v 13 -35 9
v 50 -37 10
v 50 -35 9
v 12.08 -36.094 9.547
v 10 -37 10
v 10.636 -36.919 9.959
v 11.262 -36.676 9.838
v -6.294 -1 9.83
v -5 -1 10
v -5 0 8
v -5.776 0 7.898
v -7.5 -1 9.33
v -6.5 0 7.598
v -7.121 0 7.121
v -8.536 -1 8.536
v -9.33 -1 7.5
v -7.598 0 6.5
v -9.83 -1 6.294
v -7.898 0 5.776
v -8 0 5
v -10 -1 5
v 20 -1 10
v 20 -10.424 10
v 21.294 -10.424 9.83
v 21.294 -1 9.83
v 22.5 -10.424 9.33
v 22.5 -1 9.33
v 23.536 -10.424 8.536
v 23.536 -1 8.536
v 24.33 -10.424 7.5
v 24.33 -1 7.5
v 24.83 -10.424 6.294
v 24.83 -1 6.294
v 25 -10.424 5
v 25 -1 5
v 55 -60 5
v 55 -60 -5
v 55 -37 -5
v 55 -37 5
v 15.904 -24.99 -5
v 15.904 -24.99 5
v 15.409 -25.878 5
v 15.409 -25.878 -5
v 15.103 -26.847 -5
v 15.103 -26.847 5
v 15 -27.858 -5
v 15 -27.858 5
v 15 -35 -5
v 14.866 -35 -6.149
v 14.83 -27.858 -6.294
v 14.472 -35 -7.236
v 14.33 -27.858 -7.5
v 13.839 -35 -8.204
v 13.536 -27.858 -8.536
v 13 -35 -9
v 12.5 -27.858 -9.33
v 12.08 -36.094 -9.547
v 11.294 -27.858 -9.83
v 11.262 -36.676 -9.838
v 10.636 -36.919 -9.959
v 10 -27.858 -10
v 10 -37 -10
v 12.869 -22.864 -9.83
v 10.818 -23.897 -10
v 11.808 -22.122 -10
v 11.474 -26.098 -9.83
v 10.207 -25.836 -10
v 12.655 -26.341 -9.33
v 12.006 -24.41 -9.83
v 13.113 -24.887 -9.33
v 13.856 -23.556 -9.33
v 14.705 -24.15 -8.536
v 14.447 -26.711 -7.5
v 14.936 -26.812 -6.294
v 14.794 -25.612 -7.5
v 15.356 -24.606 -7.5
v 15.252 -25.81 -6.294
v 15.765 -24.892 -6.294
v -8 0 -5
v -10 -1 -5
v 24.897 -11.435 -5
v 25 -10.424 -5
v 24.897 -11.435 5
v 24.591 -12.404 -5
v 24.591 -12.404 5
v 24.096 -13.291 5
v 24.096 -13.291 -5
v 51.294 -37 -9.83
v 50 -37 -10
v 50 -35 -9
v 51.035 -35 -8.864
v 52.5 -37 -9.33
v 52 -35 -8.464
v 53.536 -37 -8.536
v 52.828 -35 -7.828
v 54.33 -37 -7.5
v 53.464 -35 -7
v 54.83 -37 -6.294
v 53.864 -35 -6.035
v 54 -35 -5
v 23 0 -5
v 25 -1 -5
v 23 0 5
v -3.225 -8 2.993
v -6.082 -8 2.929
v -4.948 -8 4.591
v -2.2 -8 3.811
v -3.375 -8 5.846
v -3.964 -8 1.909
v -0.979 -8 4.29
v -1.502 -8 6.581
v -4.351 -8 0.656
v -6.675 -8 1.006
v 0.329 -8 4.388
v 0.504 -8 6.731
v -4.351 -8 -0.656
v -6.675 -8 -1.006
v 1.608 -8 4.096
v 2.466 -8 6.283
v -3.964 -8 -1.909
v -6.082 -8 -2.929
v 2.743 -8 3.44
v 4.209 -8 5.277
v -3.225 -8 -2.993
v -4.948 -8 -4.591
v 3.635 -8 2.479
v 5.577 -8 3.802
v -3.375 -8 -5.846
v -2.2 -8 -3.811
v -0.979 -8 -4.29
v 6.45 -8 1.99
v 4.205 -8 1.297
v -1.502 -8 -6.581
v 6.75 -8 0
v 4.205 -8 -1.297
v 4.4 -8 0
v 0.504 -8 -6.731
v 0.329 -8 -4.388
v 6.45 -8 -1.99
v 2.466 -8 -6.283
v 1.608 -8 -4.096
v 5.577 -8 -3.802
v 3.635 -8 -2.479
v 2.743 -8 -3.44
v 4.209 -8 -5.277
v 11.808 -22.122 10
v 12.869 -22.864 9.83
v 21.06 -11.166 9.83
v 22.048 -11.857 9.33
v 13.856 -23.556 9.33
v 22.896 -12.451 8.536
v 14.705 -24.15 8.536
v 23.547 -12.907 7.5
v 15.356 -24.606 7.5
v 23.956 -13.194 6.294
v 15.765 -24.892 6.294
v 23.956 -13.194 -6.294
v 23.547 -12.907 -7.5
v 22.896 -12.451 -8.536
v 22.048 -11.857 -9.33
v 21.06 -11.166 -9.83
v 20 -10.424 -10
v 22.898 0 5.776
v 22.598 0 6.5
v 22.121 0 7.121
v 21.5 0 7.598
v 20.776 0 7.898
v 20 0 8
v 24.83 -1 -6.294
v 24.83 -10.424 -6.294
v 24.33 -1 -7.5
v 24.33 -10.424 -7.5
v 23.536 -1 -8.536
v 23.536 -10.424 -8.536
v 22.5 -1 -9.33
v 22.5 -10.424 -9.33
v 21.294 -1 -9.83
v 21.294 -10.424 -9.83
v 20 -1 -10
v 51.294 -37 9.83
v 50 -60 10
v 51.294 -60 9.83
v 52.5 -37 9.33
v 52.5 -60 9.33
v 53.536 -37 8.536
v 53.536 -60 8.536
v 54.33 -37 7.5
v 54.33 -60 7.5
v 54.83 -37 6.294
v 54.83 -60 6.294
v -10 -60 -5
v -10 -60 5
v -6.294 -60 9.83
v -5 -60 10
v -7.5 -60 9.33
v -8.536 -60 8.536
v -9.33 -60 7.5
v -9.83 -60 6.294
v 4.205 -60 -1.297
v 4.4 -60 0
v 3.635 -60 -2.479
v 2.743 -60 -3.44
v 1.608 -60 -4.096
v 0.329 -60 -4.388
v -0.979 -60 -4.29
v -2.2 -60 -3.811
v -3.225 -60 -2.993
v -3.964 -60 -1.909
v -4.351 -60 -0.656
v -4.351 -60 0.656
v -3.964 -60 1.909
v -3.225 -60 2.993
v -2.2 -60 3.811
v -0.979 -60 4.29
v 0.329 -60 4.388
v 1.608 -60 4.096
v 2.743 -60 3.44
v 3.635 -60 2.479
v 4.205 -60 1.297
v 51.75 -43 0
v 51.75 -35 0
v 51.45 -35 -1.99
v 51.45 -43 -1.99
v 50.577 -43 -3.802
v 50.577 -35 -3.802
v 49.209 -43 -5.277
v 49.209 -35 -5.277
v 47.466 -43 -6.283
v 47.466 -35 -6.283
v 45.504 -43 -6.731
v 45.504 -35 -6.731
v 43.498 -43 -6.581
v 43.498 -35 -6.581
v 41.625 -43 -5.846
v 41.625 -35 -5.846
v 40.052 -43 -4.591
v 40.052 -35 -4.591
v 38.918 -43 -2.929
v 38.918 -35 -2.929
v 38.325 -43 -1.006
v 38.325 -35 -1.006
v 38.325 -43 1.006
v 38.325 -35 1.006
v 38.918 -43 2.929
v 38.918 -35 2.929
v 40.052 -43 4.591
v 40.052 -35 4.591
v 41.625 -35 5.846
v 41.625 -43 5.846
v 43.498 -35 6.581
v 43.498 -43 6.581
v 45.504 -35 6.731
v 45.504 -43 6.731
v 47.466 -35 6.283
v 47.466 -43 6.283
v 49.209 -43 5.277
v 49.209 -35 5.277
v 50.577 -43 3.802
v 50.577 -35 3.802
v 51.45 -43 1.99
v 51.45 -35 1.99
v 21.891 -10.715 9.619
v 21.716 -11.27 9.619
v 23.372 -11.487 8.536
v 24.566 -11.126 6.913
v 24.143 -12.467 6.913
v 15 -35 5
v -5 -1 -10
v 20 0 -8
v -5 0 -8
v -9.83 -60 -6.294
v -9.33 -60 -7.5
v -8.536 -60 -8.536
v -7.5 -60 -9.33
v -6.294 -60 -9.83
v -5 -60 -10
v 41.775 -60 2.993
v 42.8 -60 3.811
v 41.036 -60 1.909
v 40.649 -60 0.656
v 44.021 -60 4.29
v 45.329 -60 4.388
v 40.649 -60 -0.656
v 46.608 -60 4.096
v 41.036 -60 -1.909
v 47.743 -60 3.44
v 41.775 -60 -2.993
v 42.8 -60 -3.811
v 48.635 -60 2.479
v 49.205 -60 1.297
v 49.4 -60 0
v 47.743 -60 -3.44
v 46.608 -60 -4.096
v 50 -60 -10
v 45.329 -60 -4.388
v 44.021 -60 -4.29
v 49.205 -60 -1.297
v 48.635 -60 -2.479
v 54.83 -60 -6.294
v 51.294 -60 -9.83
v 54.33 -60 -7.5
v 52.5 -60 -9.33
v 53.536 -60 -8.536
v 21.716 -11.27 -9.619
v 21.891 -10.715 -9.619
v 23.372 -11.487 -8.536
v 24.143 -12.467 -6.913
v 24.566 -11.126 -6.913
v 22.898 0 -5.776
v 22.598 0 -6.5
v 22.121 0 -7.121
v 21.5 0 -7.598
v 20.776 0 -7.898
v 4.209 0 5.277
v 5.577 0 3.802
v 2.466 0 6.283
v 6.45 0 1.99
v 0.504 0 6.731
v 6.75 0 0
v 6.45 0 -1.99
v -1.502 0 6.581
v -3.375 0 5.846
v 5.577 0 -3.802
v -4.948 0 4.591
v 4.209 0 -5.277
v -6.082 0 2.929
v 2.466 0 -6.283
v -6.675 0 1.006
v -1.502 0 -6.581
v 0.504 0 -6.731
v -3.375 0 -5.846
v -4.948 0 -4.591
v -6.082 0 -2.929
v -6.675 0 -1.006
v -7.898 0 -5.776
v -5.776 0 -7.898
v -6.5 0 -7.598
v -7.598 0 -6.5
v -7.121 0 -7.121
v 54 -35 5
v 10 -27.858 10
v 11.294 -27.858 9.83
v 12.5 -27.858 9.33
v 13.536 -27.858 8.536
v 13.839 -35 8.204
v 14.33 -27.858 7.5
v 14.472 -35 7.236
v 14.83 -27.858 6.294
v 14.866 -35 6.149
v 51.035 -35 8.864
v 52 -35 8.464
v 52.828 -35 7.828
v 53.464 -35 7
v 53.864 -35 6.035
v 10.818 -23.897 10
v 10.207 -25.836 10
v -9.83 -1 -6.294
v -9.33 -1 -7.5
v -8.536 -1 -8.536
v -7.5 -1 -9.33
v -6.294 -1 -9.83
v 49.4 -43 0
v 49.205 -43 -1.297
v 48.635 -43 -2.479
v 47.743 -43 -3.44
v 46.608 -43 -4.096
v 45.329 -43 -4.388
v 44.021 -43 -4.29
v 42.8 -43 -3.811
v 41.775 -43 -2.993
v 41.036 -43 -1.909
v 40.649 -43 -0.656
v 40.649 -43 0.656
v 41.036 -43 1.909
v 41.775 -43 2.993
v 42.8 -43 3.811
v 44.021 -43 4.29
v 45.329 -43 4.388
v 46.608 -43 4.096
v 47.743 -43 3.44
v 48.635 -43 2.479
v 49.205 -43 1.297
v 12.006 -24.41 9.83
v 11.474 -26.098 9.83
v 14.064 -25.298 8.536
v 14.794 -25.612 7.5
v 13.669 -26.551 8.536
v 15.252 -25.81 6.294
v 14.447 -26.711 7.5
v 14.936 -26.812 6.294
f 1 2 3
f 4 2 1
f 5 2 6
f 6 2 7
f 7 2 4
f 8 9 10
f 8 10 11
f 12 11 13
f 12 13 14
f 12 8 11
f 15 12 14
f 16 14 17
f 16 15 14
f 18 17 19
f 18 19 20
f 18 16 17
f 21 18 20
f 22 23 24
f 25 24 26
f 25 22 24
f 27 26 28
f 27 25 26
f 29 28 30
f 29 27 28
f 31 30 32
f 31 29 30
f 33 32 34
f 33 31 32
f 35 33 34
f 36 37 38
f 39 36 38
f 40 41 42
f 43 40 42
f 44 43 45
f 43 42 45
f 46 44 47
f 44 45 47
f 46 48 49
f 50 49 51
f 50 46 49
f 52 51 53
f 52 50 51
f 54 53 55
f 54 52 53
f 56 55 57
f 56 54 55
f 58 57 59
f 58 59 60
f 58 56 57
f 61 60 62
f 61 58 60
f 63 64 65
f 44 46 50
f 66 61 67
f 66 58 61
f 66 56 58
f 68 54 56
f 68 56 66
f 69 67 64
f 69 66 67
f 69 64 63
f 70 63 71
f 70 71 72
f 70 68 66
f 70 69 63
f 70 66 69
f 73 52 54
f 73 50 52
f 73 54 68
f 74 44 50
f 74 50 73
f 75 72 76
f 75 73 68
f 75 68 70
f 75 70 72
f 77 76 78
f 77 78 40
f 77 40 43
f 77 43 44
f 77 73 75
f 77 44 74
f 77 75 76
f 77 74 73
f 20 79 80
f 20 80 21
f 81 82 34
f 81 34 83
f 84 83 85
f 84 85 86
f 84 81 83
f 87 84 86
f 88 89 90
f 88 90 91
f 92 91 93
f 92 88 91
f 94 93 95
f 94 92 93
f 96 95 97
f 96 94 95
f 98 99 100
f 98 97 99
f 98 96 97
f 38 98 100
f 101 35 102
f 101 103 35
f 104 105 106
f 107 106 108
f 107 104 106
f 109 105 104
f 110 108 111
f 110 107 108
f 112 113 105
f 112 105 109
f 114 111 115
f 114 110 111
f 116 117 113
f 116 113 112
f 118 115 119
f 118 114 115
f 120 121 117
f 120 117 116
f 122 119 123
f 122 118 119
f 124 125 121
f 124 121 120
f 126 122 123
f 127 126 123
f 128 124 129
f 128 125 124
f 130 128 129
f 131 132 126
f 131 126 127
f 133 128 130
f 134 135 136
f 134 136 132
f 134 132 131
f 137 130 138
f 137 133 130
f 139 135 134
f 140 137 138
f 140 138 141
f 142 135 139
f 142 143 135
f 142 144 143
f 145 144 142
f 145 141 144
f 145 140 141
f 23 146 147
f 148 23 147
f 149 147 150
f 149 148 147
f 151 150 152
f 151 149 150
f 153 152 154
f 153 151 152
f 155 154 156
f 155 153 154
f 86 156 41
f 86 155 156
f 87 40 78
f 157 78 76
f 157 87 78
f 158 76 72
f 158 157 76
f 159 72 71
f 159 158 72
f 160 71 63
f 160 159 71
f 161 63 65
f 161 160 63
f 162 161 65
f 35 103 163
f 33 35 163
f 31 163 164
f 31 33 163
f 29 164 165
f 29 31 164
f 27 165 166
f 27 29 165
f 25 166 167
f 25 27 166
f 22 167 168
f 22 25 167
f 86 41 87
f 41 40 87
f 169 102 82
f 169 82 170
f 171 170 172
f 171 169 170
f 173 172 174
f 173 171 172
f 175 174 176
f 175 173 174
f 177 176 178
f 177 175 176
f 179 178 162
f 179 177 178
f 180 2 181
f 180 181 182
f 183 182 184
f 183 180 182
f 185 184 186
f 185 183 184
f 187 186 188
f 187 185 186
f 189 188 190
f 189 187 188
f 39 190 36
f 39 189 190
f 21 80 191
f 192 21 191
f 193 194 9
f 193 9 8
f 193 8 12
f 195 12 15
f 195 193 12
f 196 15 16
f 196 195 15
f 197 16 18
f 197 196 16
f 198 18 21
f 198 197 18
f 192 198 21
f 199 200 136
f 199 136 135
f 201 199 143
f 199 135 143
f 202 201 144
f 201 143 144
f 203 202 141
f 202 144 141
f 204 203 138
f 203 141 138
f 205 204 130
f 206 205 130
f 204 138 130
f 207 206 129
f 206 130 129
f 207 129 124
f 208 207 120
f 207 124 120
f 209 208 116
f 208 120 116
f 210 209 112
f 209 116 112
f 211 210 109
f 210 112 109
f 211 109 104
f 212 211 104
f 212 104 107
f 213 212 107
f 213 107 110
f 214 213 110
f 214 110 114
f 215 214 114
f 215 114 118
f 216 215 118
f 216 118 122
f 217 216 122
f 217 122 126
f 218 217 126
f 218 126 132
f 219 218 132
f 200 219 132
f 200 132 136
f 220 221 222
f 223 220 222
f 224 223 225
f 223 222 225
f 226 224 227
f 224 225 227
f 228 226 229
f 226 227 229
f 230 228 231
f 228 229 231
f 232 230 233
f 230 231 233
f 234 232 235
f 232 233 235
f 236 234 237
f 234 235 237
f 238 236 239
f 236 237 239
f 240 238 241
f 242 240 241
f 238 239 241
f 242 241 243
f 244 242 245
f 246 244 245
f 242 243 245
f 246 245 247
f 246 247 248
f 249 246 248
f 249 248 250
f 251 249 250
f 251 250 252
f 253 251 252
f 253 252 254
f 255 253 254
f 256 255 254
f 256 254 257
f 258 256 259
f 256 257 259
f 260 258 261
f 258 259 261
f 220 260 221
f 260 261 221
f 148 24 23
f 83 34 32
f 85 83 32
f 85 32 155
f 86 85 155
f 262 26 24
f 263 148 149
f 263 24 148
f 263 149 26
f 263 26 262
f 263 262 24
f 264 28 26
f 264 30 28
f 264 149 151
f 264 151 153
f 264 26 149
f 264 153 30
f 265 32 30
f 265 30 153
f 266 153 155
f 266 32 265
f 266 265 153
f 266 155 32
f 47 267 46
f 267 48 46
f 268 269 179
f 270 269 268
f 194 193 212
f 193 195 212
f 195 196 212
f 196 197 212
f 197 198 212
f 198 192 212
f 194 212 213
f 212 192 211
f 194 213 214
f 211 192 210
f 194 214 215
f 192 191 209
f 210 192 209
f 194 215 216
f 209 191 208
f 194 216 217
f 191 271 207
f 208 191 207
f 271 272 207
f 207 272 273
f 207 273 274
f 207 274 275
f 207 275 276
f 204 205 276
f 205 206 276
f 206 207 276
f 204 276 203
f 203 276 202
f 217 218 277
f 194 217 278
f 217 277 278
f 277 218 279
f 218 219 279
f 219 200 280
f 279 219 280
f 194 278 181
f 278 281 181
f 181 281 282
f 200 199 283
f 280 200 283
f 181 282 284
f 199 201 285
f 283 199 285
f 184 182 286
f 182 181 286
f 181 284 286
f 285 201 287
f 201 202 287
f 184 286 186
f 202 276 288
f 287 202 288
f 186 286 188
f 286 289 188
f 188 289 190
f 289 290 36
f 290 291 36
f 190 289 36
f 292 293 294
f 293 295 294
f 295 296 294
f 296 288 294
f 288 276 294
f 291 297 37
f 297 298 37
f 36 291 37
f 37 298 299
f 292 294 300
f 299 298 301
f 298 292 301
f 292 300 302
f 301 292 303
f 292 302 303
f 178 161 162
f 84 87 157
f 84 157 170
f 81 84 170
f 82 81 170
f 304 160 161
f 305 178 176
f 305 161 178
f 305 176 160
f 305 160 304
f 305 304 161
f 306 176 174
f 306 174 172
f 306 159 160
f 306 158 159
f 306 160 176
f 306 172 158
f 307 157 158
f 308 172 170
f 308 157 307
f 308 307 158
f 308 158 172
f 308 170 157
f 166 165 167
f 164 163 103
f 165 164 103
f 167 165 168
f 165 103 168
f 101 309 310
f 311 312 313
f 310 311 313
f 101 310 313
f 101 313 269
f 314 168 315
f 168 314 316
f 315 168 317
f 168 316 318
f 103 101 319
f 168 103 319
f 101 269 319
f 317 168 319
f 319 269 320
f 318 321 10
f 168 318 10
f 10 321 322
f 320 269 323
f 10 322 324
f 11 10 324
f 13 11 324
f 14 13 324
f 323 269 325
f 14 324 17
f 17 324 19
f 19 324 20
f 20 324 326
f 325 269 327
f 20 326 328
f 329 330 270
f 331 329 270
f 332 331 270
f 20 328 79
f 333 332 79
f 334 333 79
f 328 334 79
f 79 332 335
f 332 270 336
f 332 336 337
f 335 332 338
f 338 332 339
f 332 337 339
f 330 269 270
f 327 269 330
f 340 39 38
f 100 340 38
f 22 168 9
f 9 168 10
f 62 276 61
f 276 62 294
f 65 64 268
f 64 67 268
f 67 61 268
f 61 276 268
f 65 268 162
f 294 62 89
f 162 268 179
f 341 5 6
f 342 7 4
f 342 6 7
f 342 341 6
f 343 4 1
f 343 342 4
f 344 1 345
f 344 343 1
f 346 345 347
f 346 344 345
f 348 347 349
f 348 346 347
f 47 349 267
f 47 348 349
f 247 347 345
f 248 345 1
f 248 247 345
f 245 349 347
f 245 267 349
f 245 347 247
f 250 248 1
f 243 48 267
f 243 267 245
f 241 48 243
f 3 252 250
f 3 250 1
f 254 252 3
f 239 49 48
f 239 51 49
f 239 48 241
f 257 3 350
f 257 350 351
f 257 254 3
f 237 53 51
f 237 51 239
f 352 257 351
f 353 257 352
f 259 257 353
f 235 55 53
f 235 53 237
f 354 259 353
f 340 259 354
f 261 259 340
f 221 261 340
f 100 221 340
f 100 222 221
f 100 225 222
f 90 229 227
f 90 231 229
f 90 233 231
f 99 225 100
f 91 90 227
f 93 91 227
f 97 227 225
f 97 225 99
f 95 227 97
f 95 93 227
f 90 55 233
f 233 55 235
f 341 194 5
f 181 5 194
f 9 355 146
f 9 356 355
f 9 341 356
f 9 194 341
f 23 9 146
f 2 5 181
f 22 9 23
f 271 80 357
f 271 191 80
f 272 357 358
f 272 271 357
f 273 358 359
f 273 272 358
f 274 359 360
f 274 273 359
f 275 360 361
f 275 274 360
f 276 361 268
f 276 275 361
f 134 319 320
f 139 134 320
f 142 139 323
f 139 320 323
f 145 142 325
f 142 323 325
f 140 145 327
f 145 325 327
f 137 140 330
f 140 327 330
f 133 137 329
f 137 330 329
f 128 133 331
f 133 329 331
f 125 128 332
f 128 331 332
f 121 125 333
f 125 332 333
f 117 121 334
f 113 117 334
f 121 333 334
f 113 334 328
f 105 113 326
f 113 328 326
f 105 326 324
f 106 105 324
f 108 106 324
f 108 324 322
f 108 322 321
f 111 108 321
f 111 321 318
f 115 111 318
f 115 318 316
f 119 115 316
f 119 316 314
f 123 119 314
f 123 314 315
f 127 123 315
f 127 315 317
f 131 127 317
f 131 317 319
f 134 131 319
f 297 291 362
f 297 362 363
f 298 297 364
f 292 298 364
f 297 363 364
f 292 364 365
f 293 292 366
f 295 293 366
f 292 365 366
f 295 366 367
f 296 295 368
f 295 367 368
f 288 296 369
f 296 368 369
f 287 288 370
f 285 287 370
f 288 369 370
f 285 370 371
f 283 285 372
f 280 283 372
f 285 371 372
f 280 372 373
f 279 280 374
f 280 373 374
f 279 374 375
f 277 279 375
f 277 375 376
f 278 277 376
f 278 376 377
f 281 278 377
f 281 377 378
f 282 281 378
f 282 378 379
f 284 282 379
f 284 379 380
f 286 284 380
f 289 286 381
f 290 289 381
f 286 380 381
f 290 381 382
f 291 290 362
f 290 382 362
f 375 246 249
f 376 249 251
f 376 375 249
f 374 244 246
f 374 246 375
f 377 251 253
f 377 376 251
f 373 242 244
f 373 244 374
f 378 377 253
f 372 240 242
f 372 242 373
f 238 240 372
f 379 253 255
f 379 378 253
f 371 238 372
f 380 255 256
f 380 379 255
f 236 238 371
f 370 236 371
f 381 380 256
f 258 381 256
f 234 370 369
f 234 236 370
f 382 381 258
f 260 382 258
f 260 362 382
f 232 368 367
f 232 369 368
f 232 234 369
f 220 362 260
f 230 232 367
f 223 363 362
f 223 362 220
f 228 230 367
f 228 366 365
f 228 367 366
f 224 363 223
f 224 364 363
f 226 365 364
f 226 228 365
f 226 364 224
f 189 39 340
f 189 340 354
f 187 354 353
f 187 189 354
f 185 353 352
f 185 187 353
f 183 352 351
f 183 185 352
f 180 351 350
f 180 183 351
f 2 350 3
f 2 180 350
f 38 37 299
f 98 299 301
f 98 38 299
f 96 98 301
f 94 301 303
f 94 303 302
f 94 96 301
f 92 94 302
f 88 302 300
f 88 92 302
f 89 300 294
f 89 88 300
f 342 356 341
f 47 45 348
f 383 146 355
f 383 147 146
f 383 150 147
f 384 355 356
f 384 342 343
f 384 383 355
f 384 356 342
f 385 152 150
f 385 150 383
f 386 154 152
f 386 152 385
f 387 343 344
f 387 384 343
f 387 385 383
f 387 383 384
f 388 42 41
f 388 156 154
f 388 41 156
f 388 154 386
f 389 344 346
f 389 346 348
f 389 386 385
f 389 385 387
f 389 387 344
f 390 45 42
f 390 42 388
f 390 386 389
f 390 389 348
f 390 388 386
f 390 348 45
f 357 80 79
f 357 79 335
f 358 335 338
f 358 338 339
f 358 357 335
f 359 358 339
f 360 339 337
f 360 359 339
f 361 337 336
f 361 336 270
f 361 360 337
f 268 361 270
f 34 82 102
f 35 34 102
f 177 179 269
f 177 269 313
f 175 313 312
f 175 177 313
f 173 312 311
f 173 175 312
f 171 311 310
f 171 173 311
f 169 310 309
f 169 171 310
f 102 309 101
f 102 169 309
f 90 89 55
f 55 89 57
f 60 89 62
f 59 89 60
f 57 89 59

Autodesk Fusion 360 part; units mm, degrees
sketch "Sketch1" plane through (0, 0, 0) normal (0, 1, 0) x (1, 0, 0)
  line L0 (0, 0) -> (45, 0) construction
  circle A0 centre (45, 0) radius 6.75
  circle A1 centre (0, 0) radius 6.75
  circle A2 centre (0, 0) radius 4.4
  circle A3 centre (45, 0) radius 4.4
  line L1 (-10, -10) -> (55, -10)
  line L2 (55, -10) -> (55, 10)
  line L3 (55, 10) -> (-10, 10)
  line L4 (-10, 10) -> (-10, -10)
  line L5 (22.5, -10) -> (22.5, 10) construction
  dimension "d1" = 45
  dimension "d2" = 8.8
  dimension "d3" = 13.5
  dimension "d4" = 20
  dimension "d5" = 65
sketch "Sketch2" plane through (0, 0, 0) normal (0, 0, 1) x (1, 0, 0)
  line L0 (55, 0) -> (-10, 0)
  line L1 (-10, 0) -> (-10, -60)
  line L2 (-10, -60) -> (55, -60)
  line L3 (55, -60) -> (55, 0)
  line L4 (15, -35) -> (55, -35)
  line L5 (15, -35) -> (15, -26.2815)
  line L6 (15, -26.2815) -> (25, -12)
  line L7 (25, -12) -> (25, 0)
  line L8 (0, 0) -> (45, 0)
  dimension "d6" = 60
  dimension "d7" = 10
  dimension "d8" = 25
  dimension "d9" = 25
  dimension "d10" = 145
  dimension "d11" = 12
extrude "Extrude1" add sketch "Sketch2" along normal up to surface (10 mm away) and the other way up to surface (10 mm away) contours L0 L1 L2 L3 L4 L5 L6 L7 L8
fillet "Fillet1" radius 5 12 edges at (25, -6, 10) (25, -6, -10) (-10, -30, -10) (-10, -30, 10) (55, -47.5, -10) (55, -47.5, 10) (20, -19.1407, 10) (20, -19.1407, -10) (25, -12, 0) (15, -30.6407, 10) (15, -30.6407, -10) (15, -26.2815, 0)
extrude "Extrude2" cut sketch "Sketch1" against normal through all contours A2 | A3
extrude "Extrude3" cut sketch "Sketch1" against normal blind 8 contours A1
extrude "Extrude4" cut sketch "Sketch1" against normal blind 8 from surface at -35 contours A0
chamfer "Chamfer1" distance 1 distance2 2 13 edges at (-10, 0, 0) (-8.5355, 0, -8.5355) (7.5, 0, -10) (23.5355, 0, -8.5355) (25, 0, 0) (23.5355, 0, 8.5355) (7.5, 0, 10) (-8.5355, 0, 8.5355) (30, -35, 10) (53.5355, -35, 8.5355) (55, -35, 0) (53.5355, -35, -8.5355) (30, -35, -10) measured on face at (-10, -20, -1.6667) measured on face at (-5.2379, -20, -9.9943) measured on face at (18.9167, 0, 0) measured on face at (24.9943, -6.949, -5.2379) measured on face at (25, -3.4745, -1.6667) measured on face at (24.9943, -6.949, 5.2379) measured on face at (18.9167, 0, 0) measured on face at (-9.9774, -40, 5.4753) measured on face at (22.75, -35, 0) measured on face at (50.2379, -51.6667, 9.9943) measured on face at (55, -51.6667, -1.6667) measured on face at (50.2379, -51.6667, -9.9943) measured on face at (22.75, -35, 0)
equation "d8 = 33 mm - 8 mm"
